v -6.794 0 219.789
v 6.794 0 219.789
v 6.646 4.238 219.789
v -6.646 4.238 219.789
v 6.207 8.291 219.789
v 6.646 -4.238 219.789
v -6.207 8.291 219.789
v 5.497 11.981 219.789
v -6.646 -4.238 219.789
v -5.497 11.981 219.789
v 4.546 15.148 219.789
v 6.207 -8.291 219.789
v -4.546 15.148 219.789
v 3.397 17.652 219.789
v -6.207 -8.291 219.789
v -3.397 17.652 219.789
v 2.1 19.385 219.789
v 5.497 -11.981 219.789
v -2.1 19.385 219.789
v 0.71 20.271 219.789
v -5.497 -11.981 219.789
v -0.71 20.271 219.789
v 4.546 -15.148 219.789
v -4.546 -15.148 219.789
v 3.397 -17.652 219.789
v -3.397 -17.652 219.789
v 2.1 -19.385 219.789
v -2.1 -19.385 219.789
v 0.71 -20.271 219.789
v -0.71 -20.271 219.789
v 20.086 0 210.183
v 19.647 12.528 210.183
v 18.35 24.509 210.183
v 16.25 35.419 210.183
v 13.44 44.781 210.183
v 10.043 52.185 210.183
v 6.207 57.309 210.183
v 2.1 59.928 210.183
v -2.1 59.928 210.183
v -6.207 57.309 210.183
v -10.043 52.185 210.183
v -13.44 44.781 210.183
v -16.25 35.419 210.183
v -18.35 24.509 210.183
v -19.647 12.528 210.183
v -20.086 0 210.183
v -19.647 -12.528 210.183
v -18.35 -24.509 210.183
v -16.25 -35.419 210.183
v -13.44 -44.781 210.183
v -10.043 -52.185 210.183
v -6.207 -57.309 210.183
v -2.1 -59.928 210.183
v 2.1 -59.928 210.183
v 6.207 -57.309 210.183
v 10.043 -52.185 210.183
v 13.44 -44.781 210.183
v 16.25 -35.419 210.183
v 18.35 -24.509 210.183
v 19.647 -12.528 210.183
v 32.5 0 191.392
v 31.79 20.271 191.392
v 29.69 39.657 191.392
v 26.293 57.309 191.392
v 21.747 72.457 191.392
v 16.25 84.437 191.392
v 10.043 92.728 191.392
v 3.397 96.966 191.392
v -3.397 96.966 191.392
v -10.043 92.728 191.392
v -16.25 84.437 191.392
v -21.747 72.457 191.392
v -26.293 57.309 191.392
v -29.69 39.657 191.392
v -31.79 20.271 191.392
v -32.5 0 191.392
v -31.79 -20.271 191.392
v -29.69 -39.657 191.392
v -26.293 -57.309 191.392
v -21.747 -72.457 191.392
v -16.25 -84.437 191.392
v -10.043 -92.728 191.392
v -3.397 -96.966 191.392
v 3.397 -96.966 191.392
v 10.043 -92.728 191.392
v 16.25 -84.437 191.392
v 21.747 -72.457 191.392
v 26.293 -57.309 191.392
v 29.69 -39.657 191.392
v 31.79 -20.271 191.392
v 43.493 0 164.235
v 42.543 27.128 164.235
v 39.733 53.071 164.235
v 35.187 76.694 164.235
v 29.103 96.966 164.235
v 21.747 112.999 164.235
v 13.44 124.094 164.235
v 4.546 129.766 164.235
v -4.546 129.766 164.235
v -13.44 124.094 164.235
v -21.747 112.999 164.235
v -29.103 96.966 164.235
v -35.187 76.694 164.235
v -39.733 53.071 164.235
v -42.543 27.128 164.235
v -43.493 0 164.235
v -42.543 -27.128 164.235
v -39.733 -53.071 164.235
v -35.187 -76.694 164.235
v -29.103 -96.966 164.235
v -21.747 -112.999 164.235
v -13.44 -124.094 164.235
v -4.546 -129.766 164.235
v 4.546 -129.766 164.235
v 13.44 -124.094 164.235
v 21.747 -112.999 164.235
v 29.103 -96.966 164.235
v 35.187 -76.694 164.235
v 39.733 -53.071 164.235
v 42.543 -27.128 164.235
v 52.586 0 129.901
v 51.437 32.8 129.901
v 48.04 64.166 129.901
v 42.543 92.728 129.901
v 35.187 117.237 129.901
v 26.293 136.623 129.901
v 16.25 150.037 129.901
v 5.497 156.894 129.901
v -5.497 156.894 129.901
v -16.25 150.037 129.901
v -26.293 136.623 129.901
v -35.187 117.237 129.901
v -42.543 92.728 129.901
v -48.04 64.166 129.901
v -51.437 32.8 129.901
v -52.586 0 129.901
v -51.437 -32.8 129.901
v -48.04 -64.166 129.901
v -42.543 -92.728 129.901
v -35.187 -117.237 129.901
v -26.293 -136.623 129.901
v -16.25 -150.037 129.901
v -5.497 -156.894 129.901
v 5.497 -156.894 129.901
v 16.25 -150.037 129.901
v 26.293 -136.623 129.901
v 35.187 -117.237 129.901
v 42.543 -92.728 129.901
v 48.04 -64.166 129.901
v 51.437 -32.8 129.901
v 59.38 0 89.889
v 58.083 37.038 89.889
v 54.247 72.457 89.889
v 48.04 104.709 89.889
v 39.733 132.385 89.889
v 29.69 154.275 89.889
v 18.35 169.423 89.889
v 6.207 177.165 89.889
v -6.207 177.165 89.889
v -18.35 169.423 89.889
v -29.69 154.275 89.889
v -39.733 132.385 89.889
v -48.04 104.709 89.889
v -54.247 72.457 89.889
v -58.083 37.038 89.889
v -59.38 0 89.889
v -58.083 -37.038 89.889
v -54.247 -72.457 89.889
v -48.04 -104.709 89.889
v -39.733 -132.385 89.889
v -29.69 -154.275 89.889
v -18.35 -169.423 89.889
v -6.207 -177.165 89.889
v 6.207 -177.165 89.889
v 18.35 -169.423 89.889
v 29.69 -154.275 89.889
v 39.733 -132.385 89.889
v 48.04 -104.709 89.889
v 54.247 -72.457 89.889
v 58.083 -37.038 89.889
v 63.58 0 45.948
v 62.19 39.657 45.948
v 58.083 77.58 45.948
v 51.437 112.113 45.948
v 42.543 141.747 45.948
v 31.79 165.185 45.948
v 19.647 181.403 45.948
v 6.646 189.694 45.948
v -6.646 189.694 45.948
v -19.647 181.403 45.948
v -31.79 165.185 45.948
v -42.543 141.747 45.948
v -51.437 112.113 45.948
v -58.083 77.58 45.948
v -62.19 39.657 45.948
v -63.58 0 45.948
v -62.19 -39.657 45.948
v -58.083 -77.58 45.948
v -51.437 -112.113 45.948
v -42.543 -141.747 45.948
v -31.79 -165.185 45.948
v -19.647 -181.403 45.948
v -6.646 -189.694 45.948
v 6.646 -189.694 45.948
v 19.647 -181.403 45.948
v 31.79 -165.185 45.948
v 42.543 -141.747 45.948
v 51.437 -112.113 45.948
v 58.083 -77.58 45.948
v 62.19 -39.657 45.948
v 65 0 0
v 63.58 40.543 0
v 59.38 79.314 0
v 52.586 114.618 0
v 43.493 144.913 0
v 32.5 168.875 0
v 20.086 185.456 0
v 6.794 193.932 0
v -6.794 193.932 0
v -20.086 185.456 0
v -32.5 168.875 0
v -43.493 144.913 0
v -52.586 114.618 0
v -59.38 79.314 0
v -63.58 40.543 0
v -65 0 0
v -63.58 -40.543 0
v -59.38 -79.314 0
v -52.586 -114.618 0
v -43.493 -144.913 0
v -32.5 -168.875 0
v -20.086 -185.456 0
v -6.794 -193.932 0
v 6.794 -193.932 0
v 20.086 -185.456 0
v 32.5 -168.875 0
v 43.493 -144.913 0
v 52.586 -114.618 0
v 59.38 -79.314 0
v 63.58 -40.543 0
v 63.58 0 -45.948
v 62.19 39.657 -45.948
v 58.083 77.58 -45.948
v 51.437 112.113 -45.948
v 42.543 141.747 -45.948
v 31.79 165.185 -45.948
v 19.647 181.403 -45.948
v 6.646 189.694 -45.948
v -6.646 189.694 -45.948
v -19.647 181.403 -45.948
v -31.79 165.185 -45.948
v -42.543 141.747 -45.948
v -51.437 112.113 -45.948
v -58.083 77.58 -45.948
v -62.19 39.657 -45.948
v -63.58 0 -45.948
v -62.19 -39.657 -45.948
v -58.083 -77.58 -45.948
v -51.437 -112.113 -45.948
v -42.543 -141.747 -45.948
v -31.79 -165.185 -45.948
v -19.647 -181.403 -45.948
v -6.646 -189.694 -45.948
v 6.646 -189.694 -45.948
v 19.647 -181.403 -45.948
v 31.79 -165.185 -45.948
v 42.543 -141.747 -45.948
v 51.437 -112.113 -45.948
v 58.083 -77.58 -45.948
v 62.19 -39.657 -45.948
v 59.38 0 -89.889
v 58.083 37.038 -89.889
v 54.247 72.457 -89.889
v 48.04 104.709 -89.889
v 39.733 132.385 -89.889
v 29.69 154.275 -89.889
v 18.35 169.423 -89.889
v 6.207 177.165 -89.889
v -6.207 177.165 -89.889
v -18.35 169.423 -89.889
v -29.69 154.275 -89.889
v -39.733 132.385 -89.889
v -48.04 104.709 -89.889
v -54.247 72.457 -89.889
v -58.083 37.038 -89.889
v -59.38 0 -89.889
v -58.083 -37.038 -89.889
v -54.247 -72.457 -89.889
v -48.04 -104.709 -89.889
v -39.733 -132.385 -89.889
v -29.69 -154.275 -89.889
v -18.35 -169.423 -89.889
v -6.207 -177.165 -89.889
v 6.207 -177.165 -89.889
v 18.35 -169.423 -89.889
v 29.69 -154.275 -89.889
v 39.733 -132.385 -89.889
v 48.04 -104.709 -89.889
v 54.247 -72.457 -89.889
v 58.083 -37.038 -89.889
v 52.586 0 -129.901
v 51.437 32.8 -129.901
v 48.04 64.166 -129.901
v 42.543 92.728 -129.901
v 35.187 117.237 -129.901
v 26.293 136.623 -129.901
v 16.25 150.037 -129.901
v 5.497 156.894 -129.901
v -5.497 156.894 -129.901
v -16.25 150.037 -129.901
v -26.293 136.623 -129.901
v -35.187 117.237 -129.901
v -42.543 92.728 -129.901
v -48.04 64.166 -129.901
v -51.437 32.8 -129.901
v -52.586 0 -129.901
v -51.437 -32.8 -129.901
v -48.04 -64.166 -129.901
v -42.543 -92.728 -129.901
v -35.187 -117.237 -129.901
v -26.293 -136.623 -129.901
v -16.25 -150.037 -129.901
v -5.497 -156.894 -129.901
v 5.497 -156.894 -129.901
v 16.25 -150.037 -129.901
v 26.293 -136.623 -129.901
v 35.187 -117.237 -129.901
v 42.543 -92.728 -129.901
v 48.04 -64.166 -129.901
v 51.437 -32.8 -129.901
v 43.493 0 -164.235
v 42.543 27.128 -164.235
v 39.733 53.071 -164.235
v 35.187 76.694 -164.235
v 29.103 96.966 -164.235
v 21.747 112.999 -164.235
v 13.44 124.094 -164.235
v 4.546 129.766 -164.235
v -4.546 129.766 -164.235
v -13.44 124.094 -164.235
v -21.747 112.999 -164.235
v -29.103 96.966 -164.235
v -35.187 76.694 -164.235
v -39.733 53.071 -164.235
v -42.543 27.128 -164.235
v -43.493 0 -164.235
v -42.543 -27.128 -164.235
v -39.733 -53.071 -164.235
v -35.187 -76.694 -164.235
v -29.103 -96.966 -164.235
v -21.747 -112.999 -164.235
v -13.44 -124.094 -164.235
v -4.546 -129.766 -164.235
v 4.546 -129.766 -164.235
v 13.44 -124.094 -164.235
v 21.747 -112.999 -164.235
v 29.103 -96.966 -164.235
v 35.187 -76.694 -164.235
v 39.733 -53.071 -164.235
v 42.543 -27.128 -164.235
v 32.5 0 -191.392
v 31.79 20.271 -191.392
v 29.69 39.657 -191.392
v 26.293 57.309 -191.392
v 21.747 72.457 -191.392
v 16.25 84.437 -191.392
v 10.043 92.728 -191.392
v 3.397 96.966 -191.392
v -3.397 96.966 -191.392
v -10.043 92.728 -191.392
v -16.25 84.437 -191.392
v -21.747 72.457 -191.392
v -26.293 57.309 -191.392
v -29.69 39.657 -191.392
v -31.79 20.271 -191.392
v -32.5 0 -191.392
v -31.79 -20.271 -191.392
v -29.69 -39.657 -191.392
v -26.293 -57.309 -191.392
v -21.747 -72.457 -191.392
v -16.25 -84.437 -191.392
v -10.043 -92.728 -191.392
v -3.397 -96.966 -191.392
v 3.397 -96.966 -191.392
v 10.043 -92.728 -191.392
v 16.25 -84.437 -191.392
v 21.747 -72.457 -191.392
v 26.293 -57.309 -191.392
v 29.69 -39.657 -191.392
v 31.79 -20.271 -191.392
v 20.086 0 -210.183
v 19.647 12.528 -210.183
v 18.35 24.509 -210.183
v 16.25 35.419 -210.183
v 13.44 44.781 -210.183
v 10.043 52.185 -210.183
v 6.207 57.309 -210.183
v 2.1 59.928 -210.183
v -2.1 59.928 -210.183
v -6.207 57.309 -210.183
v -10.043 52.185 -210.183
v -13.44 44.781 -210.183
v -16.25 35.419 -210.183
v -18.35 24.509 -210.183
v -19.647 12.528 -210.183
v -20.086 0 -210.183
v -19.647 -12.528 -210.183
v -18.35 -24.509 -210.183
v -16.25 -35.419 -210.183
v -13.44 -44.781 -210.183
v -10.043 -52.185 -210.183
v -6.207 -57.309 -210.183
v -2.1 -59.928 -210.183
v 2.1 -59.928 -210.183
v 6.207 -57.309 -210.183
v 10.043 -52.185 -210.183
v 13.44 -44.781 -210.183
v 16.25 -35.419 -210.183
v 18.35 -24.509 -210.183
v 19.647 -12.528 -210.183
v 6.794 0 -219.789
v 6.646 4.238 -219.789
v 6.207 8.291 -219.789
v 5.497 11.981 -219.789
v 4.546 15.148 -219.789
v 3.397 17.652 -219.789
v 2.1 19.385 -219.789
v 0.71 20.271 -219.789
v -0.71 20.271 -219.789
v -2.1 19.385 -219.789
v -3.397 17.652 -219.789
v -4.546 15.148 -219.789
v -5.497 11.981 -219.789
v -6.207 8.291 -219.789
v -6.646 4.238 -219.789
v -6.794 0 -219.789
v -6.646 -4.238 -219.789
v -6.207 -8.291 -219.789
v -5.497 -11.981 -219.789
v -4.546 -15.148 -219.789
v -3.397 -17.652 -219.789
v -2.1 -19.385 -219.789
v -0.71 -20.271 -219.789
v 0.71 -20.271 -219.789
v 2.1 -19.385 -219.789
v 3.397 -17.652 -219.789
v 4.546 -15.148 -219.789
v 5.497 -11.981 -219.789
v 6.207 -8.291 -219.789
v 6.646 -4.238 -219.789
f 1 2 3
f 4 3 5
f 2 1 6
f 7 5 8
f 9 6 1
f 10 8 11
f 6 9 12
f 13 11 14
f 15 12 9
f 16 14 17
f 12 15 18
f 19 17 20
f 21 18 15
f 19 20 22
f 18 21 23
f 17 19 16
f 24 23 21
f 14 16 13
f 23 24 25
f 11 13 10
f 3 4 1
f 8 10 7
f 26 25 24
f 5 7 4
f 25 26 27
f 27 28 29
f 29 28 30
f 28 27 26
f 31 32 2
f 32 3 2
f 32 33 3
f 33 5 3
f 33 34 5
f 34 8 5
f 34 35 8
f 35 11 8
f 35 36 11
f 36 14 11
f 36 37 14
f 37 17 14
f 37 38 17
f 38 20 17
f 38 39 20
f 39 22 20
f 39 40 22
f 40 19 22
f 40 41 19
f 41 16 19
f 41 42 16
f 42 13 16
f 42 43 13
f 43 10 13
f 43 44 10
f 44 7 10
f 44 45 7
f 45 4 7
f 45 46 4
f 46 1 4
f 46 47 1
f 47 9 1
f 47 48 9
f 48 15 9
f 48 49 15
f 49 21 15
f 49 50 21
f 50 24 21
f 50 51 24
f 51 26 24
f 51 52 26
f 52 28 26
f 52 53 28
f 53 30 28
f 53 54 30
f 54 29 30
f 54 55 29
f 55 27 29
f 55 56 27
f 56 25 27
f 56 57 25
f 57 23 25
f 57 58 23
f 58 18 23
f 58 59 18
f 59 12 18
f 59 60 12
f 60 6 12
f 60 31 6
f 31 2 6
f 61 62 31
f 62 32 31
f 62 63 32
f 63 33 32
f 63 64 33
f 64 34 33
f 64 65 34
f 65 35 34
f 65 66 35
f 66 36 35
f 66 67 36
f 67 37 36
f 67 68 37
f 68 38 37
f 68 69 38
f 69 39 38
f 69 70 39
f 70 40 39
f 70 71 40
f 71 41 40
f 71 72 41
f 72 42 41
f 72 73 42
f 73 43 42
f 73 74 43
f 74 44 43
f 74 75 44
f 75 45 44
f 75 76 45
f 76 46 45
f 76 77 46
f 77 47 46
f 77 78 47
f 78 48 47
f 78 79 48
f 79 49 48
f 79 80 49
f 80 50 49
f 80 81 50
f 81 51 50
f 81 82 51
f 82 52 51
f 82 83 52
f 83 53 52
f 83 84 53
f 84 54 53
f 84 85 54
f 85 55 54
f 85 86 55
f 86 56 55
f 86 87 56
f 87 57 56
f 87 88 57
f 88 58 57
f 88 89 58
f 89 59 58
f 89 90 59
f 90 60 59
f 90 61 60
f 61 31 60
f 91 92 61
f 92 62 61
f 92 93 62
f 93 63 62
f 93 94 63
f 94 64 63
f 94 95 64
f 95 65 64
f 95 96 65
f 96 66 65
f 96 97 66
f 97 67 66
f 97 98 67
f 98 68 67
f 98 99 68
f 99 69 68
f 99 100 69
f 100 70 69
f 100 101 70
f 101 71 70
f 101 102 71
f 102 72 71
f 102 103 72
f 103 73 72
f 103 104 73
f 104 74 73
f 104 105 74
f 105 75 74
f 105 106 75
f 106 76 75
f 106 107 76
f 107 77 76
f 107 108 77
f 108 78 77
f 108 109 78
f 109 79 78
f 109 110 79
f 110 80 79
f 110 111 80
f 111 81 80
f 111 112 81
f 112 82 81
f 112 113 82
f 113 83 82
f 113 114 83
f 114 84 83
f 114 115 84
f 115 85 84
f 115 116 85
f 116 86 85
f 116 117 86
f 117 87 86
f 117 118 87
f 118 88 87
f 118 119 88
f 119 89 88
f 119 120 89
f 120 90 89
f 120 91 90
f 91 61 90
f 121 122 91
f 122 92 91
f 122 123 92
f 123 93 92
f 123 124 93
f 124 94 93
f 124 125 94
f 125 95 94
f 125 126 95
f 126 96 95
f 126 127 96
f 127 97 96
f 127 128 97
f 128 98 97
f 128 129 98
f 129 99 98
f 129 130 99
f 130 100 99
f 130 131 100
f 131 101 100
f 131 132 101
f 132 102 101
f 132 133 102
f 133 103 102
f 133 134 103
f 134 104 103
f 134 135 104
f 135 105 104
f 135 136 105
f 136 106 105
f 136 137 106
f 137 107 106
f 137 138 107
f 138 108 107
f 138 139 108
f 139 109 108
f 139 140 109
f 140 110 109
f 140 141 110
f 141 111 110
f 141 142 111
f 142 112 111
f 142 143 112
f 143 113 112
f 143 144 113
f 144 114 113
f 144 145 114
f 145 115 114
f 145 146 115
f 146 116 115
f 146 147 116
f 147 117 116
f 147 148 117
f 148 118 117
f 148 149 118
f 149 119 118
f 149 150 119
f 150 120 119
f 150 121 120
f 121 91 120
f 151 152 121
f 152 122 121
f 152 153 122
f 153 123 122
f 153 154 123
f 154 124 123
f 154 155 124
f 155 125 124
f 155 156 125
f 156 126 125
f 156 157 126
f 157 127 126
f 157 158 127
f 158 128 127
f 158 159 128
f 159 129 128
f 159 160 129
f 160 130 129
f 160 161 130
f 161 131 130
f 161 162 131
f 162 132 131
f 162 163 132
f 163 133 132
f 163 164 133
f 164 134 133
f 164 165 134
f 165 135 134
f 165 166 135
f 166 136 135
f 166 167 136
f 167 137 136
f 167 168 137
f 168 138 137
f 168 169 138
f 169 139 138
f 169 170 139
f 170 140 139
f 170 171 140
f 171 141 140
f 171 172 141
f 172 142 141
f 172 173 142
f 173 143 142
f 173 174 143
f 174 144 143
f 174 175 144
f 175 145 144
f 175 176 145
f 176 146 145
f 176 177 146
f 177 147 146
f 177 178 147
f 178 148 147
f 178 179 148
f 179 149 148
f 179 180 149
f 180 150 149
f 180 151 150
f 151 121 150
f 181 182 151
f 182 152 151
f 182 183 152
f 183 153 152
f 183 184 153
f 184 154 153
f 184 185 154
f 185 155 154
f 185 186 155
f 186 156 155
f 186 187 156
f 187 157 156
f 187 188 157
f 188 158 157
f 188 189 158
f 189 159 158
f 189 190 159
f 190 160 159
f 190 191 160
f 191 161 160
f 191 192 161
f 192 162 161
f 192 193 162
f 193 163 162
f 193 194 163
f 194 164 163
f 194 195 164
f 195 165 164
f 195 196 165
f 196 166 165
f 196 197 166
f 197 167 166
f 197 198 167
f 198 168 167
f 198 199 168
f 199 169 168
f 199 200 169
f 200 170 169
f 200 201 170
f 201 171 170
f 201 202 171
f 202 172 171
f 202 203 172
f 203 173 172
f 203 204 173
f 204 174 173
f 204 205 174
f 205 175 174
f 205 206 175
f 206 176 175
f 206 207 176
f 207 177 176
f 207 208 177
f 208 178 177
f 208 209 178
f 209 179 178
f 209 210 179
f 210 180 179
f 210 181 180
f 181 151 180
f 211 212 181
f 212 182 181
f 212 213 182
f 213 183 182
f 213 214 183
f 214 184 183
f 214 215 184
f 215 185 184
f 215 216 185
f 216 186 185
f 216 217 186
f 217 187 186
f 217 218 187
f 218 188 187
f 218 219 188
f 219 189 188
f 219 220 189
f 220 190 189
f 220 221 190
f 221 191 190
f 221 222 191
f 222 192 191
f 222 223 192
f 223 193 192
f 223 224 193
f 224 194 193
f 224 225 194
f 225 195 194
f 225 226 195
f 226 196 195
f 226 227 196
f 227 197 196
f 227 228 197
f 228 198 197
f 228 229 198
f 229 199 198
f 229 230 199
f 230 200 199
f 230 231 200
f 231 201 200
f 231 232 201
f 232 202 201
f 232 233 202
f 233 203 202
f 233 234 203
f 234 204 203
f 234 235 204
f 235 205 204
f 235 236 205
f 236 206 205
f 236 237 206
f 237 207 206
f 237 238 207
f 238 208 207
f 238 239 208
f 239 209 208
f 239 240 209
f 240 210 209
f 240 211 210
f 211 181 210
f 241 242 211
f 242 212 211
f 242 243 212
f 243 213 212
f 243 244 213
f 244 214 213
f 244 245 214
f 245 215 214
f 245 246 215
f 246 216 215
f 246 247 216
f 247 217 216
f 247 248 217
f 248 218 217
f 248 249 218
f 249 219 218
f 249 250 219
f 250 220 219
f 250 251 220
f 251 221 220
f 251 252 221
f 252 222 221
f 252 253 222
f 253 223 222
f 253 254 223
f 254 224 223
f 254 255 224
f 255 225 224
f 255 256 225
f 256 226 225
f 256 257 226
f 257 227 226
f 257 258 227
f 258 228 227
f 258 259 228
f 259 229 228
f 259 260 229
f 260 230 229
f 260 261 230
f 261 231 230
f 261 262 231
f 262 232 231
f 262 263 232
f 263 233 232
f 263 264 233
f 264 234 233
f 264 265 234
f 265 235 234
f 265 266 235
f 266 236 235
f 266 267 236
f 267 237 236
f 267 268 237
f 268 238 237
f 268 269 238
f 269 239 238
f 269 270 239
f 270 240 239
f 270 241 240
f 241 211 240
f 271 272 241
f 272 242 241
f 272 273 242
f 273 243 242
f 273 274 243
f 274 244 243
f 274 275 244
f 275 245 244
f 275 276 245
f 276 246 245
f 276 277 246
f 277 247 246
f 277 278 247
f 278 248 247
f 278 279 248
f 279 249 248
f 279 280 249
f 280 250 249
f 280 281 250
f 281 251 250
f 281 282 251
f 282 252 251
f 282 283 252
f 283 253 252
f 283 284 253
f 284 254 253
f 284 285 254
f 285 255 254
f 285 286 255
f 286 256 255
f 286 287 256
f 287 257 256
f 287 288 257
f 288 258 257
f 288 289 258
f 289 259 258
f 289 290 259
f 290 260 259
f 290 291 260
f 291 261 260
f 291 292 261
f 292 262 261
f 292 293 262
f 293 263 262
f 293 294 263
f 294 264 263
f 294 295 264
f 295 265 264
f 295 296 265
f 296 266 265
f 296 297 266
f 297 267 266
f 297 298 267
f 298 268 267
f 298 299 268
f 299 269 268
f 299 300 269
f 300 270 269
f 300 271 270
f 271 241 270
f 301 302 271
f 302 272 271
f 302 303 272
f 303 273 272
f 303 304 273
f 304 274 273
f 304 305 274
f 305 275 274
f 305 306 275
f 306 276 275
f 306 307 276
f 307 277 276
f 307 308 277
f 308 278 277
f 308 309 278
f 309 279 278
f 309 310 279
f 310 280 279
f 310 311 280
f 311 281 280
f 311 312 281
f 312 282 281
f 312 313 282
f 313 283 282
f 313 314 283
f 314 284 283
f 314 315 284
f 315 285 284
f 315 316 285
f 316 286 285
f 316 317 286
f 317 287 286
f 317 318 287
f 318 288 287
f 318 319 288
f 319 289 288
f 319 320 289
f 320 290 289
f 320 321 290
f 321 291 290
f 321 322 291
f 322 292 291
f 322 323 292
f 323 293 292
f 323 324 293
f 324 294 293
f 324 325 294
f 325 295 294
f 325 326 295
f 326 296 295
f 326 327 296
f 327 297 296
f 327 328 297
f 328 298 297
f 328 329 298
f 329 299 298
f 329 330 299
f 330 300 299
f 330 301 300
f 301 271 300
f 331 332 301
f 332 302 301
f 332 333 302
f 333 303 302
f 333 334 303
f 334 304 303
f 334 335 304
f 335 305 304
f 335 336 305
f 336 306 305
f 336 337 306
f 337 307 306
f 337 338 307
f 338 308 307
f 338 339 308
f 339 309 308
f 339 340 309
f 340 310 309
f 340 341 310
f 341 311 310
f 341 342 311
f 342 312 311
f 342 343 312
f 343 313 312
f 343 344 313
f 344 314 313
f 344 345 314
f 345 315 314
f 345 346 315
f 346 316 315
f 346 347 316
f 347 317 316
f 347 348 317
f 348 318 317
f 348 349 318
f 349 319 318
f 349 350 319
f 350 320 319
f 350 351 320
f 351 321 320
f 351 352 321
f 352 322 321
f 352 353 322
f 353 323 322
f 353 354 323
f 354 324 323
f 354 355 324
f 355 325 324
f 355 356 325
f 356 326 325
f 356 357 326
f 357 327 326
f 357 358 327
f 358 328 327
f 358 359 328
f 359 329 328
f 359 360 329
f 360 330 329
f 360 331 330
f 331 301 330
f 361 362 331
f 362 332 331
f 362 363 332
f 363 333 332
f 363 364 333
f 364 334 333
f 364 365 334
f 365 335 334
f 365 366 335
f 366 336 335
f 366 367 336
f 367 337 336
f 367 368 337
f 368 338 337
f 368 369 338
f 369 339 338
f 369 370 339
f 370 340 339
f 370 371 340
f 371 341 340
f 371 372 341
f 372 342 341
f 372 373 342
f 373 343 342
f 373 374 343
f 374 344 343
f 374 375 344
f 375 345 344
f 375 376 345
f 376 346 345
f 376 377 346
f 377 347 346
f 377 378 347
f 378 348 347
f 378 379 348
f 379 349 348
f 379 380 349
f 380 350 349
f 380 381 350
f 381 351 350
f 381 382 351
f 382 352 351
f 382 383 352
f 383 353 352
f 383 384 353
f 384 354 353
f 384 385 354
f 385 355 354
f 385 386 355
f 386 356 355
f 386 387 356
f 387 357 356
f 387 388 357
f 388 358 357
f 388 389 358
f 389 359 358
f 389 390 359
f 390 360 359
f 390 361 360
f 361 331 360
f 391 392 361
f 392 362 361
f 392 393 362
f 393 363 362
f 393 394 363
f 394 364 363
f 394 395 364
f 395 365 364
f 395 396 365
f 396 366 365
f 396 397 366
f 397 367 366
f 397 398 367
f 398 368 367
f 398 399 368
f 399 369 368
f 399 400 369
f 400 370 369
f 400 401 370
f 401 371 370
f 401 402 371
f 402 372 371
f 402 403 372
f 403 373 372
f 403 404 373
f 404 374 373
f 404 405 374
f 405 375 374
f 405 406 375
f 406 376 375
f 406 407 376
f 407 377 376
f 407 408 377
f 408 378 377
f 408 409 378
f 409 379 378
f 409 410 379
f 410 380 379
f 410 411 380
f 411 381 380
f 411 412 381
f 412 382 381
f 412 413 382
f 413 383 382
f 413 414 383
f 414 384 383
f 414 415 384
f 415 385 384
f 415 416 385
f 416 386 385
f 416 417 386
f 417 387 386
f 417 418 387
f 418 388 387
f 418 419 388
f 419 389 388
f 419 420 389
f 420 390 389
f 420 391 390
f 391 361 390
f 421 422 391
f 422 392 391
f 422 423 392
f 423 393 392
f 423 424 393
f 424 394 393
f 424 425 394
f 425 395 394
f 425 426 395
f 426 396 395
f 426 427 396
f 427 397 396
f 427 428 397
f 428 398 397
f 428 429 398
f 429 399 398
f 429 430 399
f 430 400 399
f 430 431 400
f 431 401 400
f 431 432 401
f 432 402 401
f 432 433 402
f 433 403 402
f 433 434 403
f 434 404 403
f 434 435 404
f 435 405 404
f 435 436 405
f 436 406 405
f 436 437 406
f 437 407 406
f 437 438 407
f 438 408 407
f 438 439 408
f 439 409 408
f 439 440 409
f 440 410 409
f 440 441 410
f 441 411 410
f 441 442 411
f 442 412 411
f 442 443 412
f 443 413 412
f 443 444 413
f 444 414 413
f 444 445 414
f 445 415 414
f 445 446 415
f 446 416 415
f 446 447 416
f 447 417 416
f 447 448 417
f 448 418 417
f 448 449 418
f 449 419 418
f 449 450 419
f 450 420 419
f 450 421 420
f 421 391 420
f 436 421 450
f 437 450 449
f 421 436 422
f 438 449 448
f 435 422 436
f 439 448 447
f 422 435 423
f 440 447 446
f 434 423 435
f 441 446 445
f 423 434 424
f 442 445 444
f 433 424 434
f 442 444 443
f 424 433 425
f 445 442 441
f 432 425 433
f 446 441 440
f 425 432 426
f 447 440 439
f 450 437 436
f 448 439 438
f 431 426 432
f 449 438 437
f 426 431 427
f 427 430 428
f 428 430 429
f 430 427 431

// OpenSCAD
// Generated by SolidPython 1.0.1 on 2020-07-29 00:46:46


scale(v = [5, 15, 17]) {
	sphere(r = 13);
}
/***********************************************
*********      SolidPython code:      **********
************************************************
 
# import packages: SolidPython
from solid import *
from solid.utils import *
from itertools import chain, combinations, permutations


class Resize:

    def __init__(self, scad_file):
        self.scad_file = scad_file
        #self.scad_file = import_scad(scad_file)
        # cone/cylinder param:
        self.r1 = 0
        self.r2 = 0
        self.h = 0
        # rectangular prism param:
        self.w = 0
        self.l = 0
        # ellipse param:
        self.r = 0

    # import OpenScad code (file name corresponds to shape)


    # classify shape + parameters
    def assign(self, param1, param2, param3):
        if self.scad_file == 'cone.scad':
            self.r1 = param1
            self.r2 = param2
            self.h = param3
        elif self.scad_file == 'cylinder.scad':
            self.r1 = param1
            self.r2 = param2
            self.h = param3
        elif self.scad_file == 'rectangularPrism.scad':
            self.h = param1
            self.l = param2
            self.w = param3
        else:
            self.r = param1
            self.h = param2

    # resize parameters
    def iterate(self):
        x = range(3, 20, 2)
        i = 1
        if self.scad_file == 'cone.scad':
            tempList = list(permutations(x, 2))
            for temp in tempList:
                param1 = temp[0]
                param2 = temp[1]
                filepath = 'produced_scad_files/' + 'cone' + str(param1) + '_' + str(param2) + '_' + '.scad'
                scad_render_to_file(cylinder(h=param1, r1=param2, r2=0), filepath)

        elif self.scad_file == 'cylinder.scad':
            tempList = list(permutations(x, 3))
            for temp in tempList:
                param1 = temp[0]
                param2 = temp[1]
                filepath = 'produced_scad_files/' + 'cylinder' + str(param1) + '_' + str(param2) + '_' + '.scad'
                scad_render_to_file(cylinder(h=param1, r1=param2, r2=param2), filepath)

        elif self.scad_file == 'rectangularPrism.scad':
            tempList = list(permutations(x, 3))
            for temp in tempList:
                param1 = temp[0]
                param2 = temp[1]
                param3 = temp[2]
                filepath = 'produced_scad_files/' + 'rectangularPrism' + str(param1) + '_' + str(param2) + '_' + str(
                    param3) + '.scad'
                scad_render_to_file(cube(size=(param1, param2, param3)), filepath)

        elif self.scad_file == 'ellipse.scad':
            tempList = list(permutations(x, 4))
            for temp in tempList:
                param1 = temp[0]
                param2 = temp[1]
                param3 = temp[2]
                param4 = temp[3]
                filepath = 'produced_scad_files/' + 'ellipse' + str(param1) + '_' + str(param2) + '_' + str(param3) + '_' + str(param4) + '.scad'
                scad_render_to_file(scale([param1, param2, param3])(sphere(r=param4)), filepath)

    def render_to_scadfile(self):
        scad_render_to_file(scad, 'example.scad') 
 
************************************************/
